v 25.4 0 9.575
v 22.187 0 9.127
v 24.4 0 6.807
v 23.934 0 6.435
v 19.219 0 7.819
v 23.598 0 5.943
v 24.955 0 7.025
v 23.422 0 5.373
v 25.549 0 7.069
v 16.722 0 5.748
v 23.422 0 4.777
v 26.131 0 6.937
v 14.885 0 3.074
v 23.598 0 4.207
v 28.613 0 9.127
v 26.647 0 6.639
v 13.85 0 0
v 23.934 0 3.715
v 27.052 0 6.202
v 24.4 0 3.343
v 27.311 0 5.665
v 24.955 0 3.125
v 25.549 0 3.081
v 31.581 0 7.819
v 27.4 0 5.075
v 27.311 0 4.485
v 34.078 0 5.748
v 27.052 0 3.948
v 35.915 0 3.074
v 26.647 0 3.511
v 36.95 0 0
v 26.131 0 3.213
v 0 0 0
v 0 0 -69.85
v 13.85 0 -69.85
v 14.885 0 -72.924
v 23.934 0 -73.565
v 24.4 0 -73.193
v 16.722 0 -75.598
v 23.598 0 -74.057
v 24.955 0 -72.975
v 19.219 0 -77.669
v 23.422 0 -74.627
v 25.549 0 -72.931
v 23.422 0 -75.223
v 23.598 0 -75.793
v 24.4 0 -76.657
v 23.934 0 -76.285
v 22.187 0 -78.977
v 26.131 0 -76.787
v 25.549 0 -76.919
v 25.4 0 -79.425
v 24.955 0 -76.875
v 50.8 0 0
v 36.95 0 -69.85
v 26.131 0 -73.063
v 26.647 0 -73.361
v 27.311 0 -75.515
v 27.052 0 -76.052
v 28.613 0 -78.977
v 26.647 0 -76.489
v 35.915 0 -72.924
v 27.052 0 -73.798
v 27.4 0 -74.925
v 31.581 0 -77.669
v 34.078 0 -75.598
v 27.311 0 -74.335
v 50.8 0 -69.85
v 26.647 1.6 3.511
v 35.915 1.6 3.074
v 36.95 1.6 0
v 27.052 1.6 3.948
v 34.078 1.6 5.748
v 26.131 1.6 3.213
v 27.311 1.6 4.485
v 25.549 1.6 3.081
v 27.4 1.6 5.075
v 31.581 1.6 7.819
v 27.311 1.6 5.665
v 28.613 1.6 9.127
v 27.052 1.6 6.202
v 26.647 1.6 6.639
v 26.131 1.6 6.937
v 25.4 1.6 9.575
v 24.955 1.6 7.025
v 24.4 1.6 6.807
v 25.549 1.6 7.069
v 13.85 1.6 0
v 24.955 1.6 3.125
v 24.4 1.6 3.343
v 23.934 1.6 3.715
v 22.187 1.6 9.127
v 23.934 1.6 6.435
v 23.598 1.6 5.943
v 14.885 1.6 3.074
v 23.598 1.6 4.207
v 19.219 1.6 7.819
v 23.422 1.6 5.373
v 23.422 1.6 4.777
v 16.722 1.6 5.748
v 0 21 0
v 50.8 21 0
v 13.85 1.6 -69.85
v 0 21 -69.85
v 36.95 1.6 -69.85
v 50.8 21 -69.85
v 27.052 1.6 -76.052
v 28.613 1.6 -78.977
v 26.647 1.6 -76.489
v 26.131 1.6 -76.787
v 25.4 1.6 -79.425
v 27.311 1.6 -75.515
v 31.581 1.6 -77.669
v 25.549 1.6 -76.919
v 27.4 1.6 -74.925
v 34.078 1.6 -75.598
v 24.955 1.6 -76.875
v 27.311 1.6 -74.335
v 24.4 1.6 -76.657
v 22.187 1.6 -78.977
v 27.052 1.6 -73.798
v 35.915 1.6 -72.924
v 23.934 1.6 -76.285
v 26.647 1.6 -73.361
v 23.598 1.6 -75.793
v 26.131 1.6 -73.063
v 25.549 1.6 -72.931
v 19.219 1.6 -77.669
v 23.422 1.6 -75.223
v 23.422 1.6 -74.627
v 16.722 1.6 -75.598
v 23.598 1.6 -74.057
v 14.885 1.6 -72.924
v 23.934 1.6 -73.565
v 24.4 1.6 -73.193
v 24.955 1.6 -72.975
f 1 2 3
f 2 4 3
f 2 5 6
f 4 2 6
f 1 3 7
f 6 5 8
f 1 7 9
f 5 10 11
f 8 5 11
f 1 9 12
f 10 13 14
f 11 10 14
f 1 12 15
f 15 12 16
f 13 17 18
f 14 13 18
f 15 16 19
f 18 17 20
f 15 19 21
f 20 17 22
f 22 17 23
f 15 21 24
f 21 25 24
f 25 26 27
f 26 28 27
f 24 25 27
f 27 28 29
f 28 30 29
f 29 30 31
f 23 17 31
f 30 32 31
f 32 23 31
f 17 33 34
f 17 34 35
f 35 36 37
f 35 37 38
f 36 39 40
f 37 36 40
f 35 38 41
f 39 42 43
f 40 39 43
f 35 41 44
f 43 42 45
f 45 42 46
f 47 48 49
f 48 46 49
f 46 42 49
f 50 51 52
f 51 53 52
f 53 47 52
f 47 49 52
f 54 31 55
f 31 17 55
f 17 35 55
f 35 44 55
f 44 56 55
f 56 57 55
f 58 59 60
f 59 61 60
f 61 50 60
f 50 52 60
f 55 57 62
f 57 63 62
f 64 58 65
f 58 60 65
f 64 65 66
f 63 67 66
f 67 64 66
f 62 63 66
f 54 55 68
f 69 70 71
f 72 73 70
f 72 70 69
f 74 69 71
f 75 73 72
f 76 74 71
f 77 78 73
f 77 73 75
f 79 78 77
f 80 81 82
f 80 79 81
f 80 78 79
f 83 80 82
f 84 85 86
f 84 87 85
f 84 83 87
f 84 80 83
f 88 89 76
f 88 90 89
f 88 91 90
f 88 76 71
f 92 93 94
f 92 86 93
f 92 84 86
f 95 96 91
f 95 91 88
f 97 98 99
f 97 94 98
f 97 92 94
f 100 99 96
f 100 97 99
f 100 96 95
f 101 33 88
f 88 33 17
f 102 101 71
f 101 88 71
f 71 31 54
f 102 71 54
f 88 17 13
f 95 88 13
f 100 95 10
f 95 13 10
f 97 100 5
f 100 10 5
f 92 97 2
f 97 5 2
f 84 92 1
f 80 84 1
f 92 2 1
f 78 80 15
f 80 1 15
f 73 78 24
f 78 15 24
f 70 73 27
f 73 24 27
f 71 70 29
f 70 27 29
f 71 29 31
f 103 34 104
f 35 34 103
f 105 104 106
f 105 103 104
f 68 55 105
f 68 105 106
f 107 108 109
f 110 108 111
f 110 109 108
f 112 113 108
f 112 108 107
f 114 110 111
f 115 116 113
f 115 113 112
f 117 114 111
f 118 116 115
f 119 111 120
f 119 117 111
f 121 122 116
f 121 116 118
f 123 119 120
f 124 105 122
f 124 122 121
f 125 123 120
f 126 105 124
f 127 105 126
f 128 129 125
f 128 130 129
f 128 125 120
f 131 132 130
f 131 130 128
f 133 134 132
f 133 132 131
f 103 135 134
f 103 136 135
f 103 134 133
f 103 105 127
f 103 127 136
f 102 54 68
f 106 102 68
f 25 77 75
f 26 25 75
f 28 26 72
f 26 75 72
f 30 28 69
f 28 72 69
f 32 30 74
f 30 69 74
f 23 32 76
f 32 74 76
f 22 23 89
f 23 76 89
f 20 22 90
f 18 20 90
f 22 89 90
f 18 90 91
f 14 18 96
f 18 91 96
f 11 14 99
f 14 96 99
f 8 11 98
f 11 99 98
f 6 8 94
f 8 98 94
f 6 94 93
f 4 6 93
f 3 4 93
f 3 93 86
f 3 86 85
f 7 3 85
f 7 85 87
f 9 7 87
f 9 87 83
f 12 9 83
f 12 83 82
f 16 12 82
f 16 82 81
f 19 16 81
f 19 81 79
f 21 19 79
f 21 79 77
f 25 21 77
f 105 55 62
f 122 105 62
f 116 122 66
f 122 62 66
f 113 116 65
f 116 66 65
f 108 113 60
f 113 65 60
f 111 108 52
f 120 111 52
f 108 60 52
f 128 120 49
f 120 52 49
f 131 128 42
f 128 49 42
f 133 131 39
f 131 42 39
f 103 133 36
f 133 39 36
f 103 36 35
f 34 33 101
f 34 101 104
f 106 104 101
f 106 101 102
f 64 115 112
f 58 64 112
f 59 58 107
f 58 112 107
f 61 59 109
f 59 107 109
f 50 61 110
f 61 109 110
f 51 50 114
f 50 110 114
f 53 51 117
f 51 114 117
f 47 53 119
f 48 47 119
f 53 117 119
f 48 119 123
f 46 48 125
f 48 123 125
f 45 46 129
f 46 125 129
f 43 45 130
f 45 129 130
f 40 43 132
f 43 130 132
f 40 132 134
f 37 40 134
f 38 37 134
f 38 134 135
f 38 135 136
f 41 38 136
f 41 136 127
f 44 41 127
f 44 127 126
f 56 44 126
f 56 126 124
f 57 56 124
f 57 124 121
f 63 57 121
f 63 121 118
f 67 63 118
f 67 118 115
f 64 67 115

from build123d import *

# Parameters (mm, degrees)
SKETCH1_W           = 50.8
SKETCH1_H           = 69.85
BOSS_EXTRUDE1_DEPTH = 21
BOSS_EXTRUDE2_DEPTH = 1.6
SKETCH3_R           = 2
CUT_EXTRUDE1_DEPTH  = 2.6


with BuildPart() as part:
    # Sketch1 → Boss-Extrude1 (new body)
    with BuildSketch(Plane(origin=(0, 0, 0), x_dir=(1, 0, 0), z_dir=(0, 1, 0))):
        with Locations((25.4, 34.925)):
            Rectangle(SKETCH1_W, SKETCH1_H)
    extrude(amount=BOSS_EXTRUDE1_DEPTH)

    # Sketch2 → Boss-Extrude2 (add)
    with BuildSketch(Plane.XZ):
        with BuildLine():
            Line((37.15368799, -2.17868799), (37.15368799, -67.67131201))
            ThreePointArc((37.15368799, -67.67131201), (25.4, -79.425), (13.64631201, -67.67131201))
            Line((13.64631201, -67.67131201), (13.64631201, -2.17868799))
            ThreePointArc((13.64631201, -2.17868799), (25.4, 9.575), (37.15368799, -2.17868799))
        make_face()
    extrude(amount=-BOSS_EXTRUDE2_DEPTH)

    # Sketch3 → Cut-Extrude1 (cut, through all)
    with BuildSketch(Plane(origin=(0, 1.6, 0), x_dir=(1, 0, 0), z_dir=(0, 1, 0))):
        with Locations((25.4, 74.925)):
            Circle(SKETCH3_R)
        with Locations((25.4, -5.075)):
            Circle(SKETCH3_R)
    extrude(amount=-CUT_EXTRUDE1_DEPTH, mode=Mode.SUBTRACT)


solid = part.part
